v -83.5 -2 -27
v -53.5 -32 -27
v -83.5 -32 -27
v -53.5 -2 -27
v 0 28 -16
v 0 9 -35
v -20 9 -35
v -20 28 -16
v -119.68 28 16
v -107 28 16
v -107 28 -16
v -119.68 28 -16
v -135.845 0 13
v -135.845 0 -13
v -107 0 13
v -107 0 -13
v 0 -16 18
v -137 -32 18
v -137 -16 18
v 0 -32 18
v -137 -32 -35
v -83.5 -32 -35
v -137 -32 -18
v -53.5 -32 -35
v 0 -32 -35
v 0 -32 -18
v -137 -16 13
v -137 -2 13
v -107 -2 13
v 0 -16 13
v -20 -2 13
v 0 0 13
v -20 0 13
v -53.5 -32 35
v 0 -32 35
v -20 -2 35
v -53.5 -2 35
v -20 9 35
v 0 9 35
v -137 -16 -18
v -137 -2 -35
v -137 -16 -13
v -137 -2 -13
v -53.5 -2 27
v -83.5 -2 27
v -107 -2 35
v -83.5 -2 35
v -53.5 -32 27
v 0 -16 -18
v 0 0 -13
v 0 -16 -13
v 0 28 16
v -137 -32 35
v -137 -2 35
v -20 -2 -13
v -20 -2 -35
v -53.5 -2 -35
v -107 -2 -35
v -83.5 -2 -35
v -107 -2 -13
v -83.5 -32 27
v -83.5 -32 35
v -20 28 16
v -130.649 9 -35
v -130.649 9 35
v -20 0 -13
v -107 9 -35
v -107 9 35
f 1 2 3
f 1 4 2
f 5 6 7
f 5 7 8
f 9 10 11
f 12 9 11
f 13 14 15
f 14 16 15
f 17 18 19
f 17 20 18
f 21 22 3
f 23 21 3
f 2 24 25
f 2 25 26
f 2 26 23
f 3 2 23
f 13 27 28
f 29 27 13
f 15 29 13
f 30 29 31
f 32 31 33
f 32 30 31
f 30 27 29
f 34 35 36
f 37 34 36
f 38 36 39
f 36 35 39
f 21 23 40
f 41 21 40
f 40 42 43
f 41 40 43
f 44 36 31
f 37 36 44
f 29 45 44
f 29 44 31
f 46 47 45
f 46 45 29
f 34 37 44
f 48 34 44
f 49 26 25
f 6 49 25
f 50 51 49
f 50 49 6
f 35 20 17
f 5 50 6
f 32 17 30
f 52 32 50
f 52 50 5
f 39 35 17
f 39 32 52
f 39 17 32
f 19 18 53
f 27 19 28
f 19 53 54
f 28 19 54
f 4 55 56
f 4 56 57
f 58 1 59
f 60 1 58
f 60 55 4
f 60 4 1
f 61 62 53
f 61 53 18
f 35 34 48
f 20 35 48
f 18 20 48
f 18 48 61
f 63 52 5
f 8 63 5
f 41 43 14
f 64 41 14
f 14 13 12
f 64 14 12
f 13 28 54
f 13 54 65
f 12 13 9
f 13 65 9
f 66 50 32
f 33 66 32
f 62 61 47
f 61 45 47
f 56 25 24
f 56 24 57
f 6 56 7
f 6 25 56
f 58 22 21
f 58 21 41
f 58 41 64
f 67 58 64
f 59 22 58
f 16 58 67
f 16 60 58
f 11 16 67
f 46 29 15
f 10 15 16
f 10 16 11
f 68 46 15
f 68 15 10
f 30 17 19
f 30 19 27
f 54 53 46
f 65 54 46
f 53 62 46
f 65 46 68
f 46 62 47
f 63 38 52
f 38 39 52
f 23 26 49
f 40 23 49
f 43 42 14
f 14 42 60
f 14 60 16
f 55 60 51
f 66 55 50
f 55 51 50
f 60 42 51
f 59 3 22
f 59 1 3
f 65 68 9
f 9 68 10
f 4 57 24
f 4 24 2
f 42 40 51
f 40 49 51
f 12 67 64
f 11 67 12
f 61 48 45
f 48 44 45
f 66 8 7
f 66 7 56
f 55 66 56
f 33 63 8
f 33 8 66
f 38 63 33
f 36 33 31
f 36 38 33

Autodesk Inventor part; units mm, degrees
ref_plane "YZ Plane" through (0, 0, 0) normal (1, 0, 0) x (0, 1, 0)
ref_plane "XZ Plane" through (0, 0, 0) normal (0, 1, 0) x (-1, 0, 0)
ref_plane "XY Plane" through (0, 0, 0) normal (0, 0, 1) x (1, 0, 0)
sketch "草圖1" plane through (0, 0, 0) normal (1, 0, 0) x (0, 1, 0)
  line L0 (-32, 35) -> (9, 35)
  line L1 (9, 35) -> (28, 16)
  line L2 (28, 16) -> (28, 0)
  line L3 (-32, 35) -> (-32, 18)
  line L4 (-32, 18) -> (-16, 18)
  line L5 (-16, 18) -> (-16, 13)
  line L6 (-16, 13) -> (0, 13)
  line L7 (0, 13) -> (0, 6.0328)
  line L8 (28, 0) -> (52.708, 0)
  line L9 (-32, -35) -> (9, -35)
  line L10 (9, -35) -> (28, -16)
  line L11 (28, -16) -> (28, 0)
  line L12 (-32, -35) -> (-32, -18)
  line L13 (-32, -18) -> (-16, -18)
  line L14 (-16, -18) -> (-16, -13)
  line L15 (-16, -13) -> (0, -13)
  line L16 (0, -13) -> (0, 6.0328)
  point P0 (0, 0)
  dimension "d0" = 19
  dimension "d1" = 70
  dimension "d2" = 26
  dimension "d3" = 36
  dimension "d4" = 32
  dimension "d5" = 60
  dimension "d6" = 16
  dimension "d7" = 0
  dimension "d8" = 19
extrude "擠出1" add sketch "草圖1" against normal blind 137
sketch "草圖2" plane through (0, -32, 35) normal (0, 0, 1) x (1, 0, 0)
  line L0 (-137, 0) -> (-137, 41) projected
  line L1 (-137, 30) -> (-119.6795, 60)
  line L2 (0, 60) -> (-137, 60) projected
  line L3 (-137, 60) -> (-137, 30)
  line L4 (-119.6795, 60) -> (-137, 60)
  point P0 (0, 32)
  dimension "d12" = 30
  dimension "d13" = 30
extrude "擠出2" cut sketch "草圖2" against normal blind 137
sketch "草圖3" plane through (0, -32, 35) normal (0, 0, 1) x (1, 0, 0)
  line L0 (0, 60) -> (-119.6795, 60) projected
  line L1 (-107, 60) -> (-20, 60)
  line L2 (-20, 60) -> (-20, 30)
  line L3 (-20, 30) -> (-107, 30)
  line L4 (-107, 30) -> (-107, 60)
  line L5 (-137, 0) -> (-137, 30) projected
  point P0 (0, 32)
  dimension "d16" = 30
  dimension "d17" = 30
  dimension "d18" = 87
extrude "擠出3" cut sketch "草圖3" against normal blind 137
sketch "草圖4" plane through (-107, -2, 35) normal (0, 1, 0) x (1, 0, 0)
  line L0 (87, 0) -> (0, 0) projected
  line L1 (23.5, 0) -> (53.5, 0)
  line L2 (53.5, 0) -> (53.5, 8)
  line L3 (53.5, 8) -> (23.5, 8)
  line L4 (23.5, 8) -> (23.5, 0)
  line L5 (107, 70) -> (-30, 70) projected
  line L6 (23.5, 70) -> (53.5, 70)
  line L7 (53.5, 70) -> (53.5, 62)
  line L8 (53.5, 62) -> (23.5, 62)
  line L9 (23.5, 62) -> (23.5, 70)
  line L10 (-30, 0) -> (-30, 22) projected
  line L11 (-30, 48) -> (-30, 70) projected
  point P0 (107, 35)
  dimension "d21" = 53.5
  dimension "d22" = 53.5
  dimension "d23" = 30
  dimension "d24" = 30
  dimension "d25" = 8
  dimension "d26" = 8
extrude "擠出4" cut sketch "草圖4" against normal blind 137
properties part number "410571040-2"
